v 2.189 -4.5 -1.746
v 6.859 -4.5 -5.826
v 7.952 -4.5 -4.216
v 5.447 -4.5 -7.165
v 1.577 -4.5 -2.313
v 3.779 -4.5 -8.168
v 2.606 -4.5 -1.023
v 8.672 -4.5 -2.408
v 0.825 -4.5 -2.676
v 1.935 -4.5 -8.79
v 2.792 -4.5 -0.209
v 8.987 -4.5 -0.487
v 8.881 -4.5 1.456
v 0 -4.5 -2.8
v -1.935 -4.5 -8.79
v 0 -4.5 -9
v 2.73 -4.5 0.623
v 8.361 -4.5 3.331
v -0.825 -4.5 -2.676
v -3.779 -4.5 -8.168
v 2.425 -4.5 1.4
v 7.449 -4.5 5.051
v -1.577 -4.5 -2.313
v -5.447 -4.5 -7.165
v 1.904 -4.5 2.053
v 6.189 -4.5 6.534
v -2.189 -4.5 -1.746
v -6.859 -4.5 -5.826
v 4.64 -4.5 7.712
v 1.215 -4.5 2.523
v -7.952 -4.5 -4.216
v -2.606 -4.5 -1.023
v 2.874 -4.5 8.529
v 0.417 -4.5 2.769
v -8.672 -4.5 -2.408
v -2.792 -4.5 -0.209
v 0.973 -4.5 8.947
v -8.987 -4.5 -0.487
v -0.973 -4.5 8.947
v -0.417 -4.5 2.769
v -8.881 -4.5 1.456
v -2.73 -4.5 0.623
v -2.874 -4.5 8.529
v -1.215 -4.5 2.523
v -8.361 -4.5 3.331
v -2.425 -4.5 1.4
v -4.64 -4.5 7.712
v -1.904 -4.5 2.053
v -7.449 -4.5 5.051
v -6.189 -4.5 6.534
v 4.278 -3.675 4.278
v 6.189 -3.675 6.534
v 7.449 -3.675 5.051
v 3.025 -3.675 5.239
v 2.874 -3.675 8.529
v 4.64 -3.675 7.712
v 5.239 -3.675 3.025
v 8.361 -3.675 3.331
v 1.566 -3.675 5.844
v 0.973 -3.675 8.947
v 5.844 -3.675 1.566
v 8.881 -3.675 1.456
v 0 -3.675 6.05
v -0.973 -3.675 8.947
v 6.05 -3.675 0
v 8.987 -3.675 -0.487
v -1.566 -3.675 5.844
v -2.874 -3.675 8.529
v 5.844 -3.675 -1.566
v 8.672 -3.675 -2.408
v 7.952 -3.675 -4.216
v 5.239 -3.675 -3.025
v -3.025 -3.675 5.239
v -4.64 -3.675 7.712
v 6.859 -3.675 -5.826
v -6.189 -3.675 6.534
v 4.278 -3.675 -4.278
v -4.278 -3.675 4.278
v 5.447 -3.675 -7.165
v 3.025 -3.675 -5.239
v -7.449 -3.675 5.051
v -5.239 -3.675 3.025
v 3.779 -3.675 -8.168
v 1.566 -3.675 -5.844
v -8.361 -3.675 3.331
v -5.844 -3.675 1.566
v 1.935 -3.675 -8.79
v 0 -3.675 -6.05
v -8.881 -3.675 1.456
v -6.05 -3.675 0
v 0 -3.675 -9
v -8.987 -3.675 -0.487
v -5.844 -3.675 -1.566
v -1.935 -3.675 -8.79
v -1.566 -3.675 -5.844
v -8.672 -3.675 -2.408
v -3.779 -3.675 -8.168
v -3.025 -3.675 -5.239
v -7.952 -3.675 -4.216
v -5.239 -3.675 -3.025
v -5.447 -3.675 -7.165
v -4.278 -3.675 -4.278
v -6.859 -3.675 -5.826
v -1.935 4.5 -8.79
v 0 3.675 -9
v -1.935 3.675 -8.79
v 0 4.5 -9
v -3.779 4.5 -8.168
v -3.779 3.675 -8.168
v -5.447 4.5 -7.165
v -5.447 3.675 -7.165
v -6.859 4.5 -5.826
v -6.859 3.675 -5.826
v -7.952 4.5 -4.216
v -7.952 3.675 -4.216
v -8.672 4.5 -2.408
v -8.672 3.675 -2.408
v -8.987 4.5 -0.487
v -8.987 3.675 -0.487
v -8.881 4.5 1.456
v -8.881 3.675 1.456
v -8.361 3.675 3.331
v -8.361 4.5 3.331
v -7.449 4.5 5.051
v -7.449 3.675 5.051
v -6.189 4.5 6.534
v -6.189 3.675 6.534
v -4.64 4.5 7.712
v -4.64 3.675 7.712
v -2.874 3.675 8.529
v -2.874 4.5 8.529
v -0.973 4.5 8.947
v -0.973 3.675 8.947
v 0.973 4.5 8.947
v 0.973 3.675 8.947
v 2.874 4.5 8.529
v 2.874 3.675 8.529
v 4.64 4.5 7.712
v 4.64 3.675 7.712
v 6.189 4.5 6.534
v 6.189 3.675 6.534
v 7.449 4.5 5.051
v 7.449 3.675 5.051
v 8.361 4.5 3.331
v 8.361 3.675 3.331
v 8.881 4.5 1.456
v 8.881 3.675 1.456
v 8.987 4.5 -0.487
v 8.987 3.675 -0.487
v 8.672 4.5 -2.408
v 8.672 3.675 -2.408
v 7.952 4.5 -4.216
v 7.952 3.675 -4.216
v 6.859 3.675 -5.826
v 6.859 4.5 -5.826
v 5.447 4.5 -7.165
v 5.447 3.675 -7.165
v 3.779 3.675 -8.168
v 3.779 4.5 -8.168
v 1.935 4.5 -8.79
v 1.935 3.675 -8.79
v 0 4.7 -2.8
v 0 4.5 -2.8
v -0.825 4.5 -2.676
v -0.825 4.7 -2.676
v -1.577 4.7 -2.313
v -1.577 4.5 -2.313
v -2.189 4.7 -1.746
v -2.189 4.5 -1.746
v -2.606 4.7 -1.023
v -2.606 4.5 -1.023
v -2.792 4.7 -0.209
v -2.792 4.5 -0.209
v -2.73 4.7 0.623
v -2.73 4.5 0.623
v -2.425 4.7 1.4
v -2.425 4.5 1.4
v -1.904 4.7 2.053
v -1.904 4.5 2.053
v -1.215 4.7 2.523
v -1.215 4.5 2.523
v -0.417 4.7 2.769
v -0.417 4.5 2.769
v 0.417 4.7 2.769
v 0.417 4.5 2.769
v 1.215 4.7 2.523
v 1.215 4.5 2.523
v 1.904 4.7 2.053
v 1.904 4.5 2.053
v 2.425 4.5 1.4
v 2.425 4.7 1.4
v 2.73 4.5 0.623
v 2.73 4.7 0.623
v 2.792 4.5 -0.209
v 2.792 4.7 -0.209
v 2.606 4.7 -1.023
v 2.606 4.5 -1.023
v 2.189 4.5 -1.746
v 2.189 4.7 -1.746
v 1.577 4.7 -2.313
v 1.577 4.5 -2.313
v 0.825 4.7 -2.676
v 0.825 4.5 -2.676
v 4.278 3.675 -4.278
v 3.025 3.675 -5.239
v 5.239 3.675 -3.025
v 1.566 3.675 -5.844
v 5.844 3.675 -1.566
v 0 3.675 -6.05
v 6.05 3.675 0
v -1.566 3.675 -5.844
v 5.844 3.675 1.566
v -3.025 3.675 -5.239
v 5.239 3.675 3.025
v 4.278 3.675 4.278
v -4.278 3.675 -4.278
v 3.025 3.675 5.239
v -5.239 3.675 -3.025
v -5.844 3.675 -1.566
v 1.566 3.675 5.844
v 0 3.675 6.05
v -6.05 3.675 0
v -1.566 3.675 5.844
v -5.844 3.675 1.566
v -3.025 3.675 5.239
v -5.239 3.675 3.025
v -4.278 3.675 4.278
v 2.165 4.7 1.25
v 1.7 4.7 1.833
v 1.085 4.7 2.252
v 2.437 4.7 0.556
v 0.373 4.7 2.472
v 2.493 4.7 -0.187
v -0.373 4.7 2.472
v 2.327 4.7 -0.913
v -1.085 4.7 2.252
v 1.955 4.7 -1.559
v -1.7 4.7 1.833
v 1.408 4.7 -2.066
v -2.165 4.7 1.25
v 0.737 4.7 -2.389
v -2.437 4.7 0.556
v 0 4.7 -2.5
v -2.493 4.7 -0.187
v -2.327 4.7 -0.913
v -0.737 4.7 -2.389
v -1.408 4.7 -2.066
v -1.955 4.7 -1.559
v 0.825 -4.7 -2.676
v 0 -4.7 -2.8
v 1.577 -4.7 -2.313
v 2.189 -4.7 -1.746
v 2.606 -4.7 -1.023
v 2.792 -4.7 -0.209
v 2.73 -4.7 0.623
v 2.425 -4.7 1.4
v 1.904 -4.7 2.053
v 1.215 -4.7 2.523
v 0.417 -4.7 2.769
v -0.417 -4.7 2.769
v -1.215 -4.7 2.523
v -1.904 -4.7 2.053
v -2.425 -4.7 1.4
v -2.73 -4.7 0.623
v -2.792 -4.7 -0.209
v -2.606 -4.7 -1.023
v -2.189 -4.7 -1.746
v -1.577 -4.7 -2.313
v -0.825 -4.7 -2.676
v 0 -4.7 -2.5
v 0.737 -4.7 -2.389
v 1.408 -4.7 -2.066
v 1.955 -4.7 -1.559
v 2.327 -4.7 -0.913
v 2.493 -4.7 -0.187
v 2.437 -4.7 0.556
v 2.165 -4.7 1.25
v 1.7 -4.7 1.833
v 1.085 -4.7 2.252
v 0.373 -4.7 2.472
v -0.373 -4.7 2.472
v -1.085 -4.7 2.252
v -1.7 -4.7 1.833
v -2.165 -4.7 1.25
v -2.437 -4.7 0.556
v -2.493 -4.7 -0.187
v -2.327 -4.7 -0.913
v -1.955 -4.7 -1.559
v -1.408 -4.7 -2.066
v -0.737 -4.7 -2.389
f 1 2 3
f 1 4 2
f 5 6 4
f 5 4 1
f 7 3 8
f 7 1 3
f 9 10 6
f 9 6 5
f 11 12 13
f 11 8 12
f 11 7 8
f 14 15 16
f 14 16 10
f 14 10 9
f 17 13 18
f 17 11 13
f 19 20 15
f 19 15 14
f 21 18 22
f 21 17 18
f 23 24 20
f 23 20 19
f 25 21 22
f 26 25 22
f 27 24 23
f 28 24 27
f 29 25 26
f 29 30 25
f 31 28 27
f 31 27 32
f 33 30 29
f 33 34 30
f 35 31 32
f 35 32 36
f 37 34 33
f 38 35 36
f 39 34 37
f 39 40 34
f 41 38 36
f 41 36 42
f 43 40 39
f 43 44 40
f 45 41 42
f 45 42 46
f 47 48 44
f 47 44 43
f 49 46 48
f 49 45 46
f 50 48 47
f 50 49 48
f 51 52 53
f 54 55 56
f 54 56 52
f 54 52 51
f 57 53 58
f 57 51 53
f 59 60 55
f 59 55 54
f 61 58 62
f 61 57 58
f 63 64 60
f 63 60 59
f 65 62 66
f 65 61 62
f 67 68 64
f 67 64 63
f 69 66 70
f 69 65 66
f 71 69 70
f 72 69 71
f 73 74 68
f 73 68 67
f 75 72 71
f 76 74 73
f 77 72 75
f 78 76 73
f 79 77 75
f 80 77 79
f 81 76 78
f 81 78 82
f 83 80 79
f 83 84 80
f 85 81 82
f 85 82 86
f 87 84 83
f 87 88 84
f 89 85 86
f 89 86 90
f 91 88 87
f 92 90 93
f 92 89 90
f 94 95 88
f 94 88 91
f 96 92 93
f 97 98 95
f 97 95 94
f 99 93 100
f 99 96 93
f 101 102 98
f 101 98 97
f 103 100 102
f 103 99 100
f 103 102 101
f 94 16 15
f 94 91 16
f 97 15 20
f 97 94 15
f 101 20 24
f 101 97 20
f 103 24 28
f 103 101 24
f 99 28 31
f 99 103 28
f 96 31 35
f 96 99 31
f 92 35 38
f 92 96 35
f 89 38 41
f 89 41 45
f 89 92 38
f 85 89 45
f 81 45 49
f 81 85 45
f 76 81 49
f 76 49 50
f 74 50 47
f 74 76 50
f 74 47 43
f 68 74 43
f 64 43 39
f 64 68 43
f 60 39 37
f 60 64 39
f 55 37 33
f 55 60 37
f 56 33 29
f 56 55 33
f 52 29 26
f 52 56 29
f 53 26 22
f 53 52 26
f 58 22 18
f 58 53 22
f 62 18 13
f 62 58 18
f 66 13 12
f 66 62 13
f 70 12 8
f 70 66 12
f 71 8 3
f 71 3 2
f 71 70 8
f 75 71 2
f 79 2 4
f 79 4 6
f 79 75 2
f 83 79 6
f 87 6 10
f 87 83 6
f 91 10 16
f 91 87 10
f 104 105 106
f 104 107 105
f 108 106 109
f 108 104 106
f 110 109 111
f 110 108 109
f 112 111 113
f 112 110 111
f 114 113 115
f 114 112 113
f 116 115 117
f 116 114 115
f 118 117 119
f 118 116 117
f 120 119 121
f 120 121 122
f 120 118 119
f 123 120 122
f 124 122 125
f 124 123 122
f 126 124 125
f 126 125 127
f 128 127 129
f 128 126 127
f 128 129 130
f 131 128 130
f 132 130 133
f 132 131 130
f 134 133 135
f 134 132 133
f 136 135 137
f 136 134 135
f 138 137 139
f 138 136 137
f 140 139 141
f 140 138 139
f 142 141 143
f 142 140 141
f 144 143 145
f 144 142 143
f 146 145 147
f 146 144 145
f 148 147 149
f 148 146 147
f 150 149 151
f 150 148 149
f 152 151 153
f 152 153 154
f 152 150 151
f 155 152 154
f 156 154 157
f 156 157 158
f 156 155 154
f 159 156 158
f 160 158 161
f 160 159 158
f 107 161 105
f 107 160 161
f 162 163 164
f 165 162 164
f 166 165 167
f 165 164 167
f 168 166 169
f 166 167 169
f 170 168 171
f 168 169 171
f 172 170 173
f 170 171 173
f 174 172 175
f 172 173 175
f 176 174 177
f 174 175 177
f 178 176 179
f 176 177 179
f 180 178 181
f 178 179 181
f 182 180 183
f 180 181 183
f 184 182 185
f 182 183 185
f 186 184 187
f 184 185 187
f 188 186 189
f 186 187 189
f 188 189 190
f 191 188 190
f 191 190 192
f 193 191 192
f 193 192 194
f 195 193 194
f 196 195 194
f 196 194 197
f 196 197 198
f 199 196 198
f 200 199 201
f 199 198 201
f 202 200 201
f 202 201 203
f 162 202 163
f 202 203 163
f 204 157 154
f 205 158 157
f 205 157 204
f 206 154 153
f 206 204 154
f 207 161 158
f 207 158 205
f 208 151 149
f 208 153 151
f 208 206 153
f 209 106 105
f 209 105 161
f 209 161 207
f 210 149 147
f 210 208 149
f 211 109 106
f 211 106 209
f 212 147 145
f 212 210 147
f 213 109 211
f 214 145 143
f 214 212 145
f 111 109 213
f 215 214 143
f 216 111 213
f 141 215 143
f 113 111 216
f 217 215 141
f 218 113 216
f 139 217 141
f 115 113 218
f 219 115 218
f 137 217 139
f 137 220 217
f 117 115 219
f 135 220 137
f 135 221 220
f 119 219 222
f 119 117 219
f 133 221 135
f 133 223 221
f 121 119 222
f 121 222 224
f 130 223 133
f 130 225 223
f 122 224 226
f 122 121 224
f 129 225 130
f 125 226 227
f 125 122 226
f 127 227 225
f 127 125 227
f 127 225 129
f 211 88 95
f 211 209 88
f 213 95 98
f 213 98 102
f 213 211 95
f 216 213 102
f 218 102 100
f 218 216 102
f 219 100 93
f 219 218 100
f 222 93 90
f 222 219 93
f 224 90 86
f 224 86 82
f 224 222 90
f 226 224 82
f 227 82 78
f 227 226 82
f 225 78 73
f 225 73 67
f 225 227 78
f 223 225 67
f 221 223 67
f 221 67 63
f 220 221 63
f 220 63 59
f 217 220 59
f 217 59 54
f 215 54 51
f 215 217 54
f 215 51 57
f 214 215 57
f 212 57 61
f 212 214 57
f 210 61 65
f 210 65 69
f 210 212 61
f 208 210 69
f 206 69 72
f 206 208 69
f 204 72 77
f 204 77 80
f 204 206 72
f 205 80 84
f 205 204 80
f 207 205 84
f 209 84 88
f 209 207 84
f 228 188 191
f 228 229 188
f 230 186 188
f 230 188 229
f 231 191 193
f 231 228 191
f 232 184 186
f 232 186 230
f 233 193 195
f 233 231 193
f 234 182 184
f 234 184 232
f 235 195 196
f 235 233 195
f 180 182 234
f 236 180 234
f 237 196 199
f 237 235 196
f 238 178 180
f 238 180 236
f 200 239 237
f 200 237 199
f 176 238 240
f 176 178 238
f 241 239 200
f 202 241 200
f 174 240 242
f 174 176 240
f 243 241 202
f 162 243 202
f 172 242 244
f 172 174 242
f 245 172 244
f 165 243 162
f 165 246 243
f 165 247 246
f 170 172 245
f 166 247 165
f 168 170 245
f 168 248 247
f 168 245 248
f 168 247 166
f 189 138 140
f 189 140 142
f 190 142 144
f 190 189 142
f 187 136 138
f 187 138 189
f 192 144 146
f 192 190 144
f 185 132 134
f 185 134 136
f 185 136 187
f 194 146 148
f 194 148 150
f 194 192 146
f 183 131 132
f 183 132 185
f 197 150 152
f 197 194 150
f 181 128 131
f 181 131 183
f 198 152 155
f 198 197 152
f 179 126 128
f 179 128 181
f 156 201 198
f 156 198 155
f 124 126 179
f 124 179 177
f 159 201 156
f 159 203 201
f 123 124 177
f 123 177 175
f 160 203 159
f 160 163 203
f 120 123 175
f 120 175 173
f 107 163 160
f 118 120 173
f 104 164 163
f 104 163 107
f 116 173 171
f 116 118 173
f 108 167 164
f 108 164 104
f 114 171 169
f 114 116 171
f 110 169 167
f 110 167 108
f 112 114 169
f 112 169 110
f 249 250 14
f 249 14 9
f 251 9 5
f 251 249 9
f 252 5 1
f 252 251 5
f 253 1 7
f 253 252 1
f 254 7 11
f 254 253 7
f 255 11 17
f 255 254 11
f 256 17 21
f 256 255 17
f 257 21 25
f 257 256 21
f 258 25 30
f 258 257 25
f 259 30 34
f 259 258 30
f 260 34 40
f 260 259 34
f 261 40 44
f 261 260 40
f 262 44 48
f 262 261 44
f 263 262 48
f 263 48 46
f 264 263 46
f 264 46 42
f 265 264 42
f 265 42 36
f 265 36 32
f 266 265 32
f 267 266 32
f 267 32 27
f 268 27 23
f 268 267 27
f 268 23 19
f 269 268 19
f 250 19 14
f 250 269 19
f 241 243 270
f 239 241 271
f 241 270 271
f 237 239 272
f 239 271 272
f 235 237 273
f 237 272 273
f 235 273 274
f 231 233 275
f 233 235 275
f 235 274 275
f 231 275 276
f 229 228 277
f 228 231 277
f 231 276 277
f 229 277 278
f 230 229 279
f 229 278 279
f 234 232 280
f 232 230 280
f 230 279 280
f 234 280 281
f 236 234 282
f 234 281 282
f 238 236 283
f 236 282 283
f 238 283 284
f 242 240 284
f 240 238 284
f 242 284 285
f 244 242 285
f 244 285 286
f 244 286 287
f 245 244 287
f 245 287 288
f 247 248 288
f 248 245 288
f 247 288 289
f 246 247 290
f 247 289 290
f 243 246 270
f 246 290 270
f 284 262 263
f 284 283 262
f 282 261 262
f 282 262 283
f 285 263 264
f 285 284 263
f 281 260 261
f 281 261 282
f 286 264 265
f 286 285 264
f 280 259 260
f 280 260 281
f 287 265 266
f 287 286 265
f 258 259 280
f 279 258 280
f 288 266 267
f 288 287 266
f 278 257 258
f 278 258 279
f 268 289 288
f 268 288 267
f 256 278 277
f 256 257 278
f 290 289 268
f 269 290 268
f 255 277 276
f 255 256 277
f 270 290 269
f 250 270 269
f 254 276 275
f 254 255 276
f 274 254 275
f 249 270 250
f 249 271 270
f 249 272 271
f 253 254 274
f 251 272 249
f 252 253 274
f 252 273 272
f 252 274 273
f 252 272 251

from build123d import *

# Parameters (mm, degrees)
ESBO_O2_R                = 2.8
ESBO_O2_R_2              = 2.5
RESSALTO_EXTRUS_O1_DEPTH = 0.2
RESSALTO_EXTRUS_O2_START = 0.2
ESBO_O4_R                = 2.8
ESBO_O4_R_2              = 2.5
RESSALTO_EXTRUS_O2_DEPTH = 0.2


with BuildPart() as part:
    # Esboço1 → Revolução1 (revolve)
    with BuildSketch(Plane.XY, mode=Mode.PRIVATE) as revolu_o1_sk:
        Polygon((-9, -4.5), (-9, -3.675), (-6.05, -3.675), (-6.05, 3.675), (-9, 3.675), (-9, 4.5), (-2.5, 4.5), (-2.5, -4.5), align=None)
    revolve(revolu_o1_sk.sketch.rotate(Axis((0, 0, 0), (0, 1, 0)), 270), axis=Axis((0, 0, 0), (0, 1, 0)))

    # Esboço2 → Ressalto-extrusão1 (add)
    with BuildSketch(Plane(origin=(0, 4.5, 0), x_dir=(1, 0, 0), z_dir=(0, 1, 0))):
        with Locations(Location((0, 0, 0), (0, 0, 90))):
            Circle(ESBO_O2_R)
        with Locations(Location((0, 0, 0), (0, 0, 90))):
            Circle(ESBO_O2_R_2, mode=Mode.SUBTRACT)
    extrude(amount=RESSALTO_EXTRUS_O1_DEPTH)

    # Esboço4 → Ressalto-extrusão2 (add)
    with BuildSketch(Plane.XZ.offset(4.5).offset(RESSALTO_EXTRUS_O2_START)):
        with Locations(Location((0, 0, 0), (0, 0, 270))):
            Circle(ESBO_O4_R)
        with Locations(Location((0, 0, 0), (0, 0, 270))):
            Circle(ESBO_O4_R_2, mode=Mode.SUBTRACT)
    extrude(amount=-RESSALTO_EXTRUS_O2_DEPTH)


solid = part.part
